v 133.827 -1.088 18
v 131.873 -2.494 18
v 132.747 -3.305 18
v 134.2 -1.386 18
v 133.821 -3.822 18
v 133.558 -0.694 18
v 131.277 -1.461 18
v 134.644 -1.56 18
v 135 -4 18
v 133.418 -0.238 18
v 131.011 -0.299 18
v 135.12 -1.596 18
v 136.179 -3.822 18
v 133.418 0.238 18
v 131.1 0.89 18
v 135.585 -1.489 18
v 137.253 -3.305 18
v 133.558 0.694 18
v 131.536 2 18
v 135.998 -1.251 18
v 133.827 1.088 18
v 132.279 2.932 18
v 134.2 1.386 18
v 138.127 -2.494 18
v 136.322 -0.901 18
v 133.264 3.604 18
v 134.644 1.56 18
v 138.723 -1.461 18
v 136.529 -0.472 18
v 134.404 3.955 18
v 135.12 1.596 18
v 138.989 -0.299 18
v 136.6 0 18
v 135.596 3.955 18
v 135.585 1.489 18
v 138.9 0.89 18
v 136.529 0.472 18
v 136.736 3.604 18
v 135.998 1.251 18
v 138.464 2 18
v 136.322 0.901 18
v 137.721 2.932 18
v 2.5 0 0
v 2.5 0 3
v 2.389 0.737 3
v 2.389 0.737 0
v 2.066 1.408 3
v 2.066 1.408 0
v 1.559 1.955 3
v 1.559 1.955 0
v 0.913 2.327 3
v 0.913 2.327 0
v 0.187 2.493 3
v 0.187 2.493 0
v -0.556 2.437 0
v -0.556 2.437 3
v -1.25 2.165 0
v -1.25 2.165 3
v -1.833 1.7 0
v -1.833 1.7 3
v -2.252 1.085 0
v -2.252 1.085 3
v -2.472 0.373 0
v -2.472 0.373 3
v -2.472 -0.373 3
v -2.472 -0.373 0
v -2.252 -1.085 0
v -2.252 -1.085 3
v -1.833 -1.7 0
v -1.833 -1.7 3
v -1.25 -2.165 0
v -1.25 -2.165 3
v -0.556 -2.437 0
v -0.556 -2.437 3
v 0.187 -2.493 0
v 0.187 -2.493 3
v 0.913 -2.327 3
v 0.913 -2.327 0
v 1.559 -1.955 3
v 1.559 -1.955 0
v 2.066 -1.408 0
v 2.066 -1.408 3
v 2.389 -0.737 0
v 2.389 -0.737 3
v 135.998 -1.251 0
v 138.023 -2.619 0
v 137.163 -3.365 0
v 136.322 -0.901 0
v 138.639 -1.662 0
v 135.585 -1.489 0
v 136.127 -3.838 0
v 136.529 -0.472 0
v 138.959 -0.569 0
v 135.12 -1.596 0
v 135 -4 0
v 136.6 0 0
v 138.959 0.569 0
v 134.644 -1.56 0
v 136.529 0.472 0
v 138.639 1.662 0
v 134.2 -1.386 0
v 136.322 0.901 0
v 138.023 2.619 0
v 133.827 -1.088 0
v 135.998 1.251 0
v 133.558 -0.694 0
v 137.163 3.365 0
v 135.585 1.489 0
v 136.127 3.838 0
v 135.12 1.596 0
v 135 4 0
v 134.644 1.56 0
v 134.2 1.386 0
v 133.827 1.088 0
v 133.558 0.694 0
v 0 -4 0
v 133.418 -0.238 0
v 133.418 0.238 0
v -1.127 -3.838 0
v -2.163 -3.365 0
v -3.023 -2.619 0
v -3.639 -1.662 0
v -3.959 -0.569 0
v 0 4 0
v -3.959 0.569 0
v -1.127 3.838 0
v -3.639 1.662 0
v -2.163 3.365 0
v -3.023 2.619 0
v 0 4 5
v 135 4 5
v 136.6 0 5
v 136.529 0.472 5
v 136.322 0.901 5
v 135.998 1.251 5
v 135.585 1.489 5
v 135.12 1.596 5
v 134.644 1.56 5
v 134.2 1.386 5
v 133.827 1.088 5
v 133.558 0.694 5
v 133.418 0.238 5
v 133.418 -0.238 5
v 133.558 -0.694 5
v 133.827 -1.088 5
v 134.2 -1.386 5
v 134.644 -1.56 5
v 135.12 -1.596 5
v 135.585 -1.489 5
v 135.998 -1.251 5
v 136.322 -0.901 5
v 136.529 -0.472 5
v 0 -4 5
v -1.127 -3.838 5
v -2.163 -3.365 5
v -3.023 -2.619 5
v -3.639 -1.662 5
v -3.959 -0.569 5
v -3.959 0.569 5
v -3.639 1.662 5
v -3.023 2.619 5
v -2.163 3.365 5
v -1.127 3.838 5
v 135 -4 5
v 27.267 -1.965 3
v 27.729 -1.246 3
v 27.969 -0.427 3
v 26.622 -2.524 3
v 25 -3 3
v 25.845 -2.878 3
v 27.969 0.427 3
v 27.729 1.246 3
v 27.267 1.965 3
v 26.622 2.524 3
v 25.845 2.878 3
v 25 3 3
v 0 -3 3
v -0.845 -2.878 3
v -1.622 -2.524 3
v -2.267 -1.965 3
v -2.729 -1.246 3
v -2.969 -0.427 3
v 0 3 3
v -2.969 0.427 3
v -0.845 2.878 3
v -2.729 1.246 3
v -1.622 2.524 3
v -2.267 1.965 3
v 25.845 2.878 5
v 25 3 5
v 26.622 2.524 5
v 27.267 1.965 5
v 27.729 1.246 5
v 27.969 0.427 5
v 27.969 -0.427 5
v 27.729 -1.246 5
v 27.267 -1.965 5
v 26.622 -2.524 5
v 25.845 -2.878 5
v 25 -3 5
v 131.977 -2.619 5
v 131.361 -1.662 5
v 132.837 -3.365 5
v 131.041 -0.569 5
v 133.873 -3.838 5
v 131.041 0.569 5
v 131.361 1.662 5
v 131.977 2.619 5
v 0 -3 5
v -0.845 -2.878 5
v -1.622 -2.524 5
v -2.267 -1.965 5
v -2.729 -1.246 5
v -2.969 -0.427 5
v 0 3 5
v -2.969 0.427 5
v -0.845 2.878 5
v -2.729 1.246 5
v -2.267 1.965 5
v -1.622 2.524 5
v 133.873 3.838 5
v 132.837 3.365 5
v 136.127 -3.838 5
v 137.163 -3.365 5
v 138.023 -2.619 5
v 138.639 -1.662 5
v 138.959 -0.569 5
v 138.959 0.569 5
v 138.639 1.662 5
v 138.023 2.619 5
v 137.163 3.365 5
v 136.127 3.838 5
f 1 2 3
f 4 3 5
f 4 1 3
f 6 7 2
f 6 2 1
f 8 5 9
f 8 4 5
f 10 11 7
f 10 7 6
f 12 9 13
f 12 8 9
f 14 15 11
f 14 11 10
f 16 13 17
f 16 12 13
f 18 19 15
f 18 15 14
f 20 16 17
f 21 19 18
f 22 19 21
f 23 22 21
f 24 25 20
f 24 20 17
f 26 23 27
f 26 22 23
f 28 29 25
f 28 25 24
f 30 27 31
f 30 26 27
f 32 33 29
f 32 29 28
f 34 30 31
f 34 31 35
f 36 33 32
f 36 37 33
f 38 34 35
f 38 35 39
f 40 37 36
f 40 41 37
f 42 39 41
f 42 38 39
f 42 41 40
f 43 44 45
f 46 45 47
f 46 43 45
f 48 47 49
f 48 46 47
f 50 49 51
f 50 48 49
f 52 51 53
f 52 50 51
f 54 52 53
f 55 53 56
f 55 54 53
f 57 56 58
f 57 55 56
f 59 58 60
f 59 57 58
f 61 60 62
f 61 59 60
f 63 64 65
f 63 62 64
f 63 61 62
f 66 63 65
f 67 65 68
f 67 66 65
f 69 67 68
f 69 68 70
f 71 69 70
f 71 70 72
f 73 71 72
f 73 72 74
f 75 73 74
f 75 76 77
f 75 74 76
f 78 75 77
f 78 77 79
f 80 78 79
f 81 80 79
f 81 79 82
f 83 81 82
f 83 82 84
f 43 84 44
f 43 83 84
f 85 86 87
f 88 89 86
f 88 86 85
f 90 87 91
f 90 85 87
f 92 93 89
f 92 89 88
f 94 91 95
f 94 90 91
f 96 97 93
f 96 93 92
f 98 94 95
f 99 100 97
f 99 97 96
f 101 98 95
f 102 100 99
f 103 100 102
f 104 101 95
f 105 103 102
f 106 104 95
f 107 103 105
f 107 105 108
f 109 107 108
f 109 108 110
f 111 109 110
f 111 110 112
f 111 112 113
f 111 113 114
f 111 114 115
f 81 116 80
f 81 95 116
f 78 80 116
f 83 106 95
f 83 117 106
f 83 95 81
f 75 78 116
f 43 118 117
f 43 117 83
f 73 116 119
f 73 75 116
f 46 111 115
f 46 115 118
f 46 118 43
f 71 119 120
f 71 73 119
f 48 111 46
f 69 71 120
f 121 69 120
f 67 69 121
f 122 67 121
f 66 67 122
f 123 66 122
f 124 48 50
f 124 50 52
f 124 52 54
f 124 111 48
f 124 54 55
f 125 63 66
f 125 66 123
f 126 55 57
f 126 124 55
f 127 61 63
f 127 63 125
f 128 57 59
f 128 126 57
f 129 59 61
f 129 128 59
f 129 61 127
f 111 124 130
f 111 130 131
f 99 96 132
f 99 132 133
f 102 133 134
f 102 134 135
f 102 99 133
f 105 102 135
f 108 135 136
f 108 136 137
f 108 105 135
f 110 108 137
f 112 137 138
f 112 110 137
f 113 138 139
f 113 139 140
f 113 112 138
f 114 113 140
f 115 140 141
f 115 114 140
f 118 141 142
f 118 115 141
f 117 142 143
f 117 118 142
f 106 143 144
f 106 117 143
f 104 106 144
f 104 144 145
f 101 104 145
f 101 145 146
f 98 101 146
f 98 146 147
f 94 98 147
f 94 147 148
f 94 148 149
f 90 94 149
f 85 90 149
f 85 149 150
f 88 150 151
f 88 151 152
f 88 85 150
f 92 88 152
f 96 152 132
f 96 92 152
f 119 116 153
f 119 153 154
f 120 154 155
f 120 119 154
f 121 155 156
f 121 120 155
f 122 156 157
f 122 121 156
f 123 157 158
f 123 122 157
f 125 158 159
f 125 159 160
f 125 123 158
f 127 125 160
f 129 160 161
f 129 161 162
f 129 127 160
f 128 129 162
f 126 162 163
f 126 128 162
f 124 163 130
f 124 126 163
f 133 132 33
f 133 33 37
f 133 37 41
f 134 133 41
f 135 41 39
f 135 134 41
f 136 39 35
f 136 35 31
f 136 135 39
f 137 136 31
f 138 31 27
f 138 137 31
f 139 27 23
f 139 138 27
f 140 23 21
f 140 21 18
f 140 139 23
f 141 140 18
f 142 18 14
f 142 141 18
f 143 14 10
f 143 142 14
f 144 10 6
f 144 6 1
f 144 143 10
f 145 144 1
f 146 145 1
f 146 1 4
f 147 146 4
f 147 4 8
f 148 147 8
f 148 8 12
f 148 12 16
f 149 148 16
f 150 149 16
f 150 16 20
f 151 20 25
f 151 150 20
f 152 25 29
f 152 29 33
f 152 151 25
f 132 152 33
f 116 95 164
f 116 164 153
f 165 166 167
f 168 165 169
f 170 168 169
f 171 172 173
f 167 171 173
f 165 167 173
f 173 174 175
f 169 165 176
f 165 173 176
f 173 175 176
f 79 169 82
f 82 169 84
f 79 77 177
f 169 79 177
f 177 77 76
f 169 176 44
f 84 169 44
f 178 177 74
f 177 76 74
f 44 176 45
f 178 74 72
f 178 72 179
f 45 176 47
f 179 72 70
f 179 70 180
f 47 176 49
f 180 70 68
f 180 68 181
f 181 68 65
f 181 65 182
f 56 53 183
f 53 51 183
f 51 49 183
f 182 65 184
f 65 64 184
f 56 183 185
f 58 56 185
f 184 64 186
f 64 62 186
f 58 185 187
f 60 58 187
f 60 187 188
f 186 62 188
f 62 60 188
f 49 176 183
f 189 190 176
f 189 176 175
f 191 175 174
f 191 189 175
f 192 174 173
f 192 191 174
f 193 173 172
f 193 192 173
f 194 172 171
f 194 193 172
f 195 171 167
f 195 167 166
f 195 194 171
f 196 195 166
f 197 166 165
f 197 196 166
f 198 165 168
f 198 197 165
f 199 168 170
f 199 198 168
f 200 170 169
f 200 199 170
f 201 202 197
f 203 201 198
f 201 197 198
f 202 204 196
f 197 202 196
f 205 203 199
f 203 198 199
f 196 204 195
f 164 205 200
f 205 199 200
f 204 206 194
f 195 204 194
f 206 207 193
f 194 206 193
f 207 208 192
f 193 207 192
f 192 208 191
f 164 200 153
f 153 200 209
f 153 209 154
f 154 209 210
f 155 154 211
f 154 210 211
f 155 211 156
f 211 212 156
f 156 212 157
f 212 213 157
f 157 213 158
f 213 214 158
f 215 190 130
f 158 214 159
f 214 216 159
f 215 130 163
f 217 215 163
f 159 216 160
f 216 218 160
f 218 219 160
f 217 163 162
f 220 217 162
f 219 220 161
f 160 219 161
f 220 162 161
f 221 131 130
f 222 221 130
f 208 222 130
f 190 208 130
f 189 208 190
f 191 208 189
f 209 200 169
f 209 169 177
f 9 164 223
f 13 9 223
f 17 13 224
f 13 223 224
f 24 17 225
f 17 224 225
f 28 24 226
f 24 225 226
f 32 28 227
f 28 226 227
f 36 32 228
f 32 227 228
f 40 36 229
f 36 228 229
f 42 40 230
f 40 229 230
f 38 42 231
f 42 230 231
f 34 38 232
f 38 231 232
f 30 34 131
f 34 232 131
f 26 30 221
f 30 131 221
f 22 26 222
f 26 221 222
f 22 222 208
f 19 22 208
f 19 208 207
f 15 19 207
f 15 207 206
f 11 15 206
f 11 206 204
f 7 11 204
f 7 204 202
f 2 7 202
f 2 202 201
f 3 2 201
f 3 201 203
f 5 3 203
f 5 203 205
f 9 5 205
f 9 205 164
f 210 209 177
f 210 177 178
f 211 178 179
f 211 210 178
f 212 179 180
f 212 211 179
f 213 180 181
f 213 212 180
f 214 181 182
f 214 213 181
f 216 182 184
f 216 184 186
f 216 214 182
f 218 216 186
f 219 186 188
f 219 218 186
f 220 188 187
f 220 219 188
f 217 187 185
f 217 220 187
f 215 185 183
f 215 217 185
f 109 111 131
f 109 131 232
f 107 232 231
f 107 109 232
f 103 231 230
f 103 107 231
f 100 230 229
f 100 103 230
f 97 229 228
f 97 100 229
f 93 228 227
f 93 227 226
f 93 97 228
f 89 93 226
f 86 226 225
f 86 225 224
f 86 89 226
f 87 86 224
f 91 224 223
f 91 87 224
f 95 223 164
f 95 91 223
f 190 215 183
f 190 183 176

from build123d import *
from build123d.topology import SkipClean

# Parameters (mm, degrees)
SKETCH2_R           = 2.5
SKETCH2_R_2         = 1.6
BOSS_EXTRUDE1_DEPTH = 5
SKETCH3_R           = 1.6
BOSS_EXTRUDE2_DEPTH = 13
CUT_EXTRUDE1_DEPTH  = 2


with BuildPart() as part:
    # Sketch2 → Boss-Extrude1 (new body)
    with BuildSketch(Plane.XY):
        with BuildLine():
            Line((0, 4), (135, 4))
            ThreePointArc((135, 4), (139, 0), (135, -4))
            Line((135, -4), (0, -4))
            ThreePointArc((0, -4), (-4, 0), (0, 4))
        make_face()
        Circle(SKETCH2_R, mode=Mode.SUBTRACT)
        with Locations((135, 0)):
            Circle(SKETCH2_R_2, mode=Mode.SUBTRACT)
    extrude(amount=BOSS_EXTRUDE1_DEPTH)

    # Sketch3 → Boss-Extrude2 (add)
    with SkipClean():  # the faces are left unmerged after this step: merging them gives an invalid solid
        with BuildSketch(Plane.XY.offset(5)):
            with BuildLine():
                ThreePointArc((135, 4), (131, 0), (135, -4))
                ThreePointArc((135, -4), (139, 0), (135, 4))
            make_face()
            with Locations((135, 0)):
                Circle(SKETCH3_R, mode=Mode.SUBTRACT)
        extrude(amount=BOSS_EXTRUDE2_DEPTH)
    add(part.part.scale(1), mode=Mode.REPLACE)  # the faces are merged on a copy

    # Sketch4 → Cut-Extrude1 (cut)
    with BuildSketch(Plane.XY.offset(5)):
        with BuildLine():
            Line((0, 3), (25, 3))
            ThreePointArc((25, 3), (28, 0), (25, -3))
            Line((25, -3), (0, -3))
            ThreePointArc((0, -3), (-3, 0), (0, 3))
        make_face()
    extrude(amount=-CUT_EXTRUDE1_DEPTH, mode=Mode.SUBTRACT)


solid = part.part
